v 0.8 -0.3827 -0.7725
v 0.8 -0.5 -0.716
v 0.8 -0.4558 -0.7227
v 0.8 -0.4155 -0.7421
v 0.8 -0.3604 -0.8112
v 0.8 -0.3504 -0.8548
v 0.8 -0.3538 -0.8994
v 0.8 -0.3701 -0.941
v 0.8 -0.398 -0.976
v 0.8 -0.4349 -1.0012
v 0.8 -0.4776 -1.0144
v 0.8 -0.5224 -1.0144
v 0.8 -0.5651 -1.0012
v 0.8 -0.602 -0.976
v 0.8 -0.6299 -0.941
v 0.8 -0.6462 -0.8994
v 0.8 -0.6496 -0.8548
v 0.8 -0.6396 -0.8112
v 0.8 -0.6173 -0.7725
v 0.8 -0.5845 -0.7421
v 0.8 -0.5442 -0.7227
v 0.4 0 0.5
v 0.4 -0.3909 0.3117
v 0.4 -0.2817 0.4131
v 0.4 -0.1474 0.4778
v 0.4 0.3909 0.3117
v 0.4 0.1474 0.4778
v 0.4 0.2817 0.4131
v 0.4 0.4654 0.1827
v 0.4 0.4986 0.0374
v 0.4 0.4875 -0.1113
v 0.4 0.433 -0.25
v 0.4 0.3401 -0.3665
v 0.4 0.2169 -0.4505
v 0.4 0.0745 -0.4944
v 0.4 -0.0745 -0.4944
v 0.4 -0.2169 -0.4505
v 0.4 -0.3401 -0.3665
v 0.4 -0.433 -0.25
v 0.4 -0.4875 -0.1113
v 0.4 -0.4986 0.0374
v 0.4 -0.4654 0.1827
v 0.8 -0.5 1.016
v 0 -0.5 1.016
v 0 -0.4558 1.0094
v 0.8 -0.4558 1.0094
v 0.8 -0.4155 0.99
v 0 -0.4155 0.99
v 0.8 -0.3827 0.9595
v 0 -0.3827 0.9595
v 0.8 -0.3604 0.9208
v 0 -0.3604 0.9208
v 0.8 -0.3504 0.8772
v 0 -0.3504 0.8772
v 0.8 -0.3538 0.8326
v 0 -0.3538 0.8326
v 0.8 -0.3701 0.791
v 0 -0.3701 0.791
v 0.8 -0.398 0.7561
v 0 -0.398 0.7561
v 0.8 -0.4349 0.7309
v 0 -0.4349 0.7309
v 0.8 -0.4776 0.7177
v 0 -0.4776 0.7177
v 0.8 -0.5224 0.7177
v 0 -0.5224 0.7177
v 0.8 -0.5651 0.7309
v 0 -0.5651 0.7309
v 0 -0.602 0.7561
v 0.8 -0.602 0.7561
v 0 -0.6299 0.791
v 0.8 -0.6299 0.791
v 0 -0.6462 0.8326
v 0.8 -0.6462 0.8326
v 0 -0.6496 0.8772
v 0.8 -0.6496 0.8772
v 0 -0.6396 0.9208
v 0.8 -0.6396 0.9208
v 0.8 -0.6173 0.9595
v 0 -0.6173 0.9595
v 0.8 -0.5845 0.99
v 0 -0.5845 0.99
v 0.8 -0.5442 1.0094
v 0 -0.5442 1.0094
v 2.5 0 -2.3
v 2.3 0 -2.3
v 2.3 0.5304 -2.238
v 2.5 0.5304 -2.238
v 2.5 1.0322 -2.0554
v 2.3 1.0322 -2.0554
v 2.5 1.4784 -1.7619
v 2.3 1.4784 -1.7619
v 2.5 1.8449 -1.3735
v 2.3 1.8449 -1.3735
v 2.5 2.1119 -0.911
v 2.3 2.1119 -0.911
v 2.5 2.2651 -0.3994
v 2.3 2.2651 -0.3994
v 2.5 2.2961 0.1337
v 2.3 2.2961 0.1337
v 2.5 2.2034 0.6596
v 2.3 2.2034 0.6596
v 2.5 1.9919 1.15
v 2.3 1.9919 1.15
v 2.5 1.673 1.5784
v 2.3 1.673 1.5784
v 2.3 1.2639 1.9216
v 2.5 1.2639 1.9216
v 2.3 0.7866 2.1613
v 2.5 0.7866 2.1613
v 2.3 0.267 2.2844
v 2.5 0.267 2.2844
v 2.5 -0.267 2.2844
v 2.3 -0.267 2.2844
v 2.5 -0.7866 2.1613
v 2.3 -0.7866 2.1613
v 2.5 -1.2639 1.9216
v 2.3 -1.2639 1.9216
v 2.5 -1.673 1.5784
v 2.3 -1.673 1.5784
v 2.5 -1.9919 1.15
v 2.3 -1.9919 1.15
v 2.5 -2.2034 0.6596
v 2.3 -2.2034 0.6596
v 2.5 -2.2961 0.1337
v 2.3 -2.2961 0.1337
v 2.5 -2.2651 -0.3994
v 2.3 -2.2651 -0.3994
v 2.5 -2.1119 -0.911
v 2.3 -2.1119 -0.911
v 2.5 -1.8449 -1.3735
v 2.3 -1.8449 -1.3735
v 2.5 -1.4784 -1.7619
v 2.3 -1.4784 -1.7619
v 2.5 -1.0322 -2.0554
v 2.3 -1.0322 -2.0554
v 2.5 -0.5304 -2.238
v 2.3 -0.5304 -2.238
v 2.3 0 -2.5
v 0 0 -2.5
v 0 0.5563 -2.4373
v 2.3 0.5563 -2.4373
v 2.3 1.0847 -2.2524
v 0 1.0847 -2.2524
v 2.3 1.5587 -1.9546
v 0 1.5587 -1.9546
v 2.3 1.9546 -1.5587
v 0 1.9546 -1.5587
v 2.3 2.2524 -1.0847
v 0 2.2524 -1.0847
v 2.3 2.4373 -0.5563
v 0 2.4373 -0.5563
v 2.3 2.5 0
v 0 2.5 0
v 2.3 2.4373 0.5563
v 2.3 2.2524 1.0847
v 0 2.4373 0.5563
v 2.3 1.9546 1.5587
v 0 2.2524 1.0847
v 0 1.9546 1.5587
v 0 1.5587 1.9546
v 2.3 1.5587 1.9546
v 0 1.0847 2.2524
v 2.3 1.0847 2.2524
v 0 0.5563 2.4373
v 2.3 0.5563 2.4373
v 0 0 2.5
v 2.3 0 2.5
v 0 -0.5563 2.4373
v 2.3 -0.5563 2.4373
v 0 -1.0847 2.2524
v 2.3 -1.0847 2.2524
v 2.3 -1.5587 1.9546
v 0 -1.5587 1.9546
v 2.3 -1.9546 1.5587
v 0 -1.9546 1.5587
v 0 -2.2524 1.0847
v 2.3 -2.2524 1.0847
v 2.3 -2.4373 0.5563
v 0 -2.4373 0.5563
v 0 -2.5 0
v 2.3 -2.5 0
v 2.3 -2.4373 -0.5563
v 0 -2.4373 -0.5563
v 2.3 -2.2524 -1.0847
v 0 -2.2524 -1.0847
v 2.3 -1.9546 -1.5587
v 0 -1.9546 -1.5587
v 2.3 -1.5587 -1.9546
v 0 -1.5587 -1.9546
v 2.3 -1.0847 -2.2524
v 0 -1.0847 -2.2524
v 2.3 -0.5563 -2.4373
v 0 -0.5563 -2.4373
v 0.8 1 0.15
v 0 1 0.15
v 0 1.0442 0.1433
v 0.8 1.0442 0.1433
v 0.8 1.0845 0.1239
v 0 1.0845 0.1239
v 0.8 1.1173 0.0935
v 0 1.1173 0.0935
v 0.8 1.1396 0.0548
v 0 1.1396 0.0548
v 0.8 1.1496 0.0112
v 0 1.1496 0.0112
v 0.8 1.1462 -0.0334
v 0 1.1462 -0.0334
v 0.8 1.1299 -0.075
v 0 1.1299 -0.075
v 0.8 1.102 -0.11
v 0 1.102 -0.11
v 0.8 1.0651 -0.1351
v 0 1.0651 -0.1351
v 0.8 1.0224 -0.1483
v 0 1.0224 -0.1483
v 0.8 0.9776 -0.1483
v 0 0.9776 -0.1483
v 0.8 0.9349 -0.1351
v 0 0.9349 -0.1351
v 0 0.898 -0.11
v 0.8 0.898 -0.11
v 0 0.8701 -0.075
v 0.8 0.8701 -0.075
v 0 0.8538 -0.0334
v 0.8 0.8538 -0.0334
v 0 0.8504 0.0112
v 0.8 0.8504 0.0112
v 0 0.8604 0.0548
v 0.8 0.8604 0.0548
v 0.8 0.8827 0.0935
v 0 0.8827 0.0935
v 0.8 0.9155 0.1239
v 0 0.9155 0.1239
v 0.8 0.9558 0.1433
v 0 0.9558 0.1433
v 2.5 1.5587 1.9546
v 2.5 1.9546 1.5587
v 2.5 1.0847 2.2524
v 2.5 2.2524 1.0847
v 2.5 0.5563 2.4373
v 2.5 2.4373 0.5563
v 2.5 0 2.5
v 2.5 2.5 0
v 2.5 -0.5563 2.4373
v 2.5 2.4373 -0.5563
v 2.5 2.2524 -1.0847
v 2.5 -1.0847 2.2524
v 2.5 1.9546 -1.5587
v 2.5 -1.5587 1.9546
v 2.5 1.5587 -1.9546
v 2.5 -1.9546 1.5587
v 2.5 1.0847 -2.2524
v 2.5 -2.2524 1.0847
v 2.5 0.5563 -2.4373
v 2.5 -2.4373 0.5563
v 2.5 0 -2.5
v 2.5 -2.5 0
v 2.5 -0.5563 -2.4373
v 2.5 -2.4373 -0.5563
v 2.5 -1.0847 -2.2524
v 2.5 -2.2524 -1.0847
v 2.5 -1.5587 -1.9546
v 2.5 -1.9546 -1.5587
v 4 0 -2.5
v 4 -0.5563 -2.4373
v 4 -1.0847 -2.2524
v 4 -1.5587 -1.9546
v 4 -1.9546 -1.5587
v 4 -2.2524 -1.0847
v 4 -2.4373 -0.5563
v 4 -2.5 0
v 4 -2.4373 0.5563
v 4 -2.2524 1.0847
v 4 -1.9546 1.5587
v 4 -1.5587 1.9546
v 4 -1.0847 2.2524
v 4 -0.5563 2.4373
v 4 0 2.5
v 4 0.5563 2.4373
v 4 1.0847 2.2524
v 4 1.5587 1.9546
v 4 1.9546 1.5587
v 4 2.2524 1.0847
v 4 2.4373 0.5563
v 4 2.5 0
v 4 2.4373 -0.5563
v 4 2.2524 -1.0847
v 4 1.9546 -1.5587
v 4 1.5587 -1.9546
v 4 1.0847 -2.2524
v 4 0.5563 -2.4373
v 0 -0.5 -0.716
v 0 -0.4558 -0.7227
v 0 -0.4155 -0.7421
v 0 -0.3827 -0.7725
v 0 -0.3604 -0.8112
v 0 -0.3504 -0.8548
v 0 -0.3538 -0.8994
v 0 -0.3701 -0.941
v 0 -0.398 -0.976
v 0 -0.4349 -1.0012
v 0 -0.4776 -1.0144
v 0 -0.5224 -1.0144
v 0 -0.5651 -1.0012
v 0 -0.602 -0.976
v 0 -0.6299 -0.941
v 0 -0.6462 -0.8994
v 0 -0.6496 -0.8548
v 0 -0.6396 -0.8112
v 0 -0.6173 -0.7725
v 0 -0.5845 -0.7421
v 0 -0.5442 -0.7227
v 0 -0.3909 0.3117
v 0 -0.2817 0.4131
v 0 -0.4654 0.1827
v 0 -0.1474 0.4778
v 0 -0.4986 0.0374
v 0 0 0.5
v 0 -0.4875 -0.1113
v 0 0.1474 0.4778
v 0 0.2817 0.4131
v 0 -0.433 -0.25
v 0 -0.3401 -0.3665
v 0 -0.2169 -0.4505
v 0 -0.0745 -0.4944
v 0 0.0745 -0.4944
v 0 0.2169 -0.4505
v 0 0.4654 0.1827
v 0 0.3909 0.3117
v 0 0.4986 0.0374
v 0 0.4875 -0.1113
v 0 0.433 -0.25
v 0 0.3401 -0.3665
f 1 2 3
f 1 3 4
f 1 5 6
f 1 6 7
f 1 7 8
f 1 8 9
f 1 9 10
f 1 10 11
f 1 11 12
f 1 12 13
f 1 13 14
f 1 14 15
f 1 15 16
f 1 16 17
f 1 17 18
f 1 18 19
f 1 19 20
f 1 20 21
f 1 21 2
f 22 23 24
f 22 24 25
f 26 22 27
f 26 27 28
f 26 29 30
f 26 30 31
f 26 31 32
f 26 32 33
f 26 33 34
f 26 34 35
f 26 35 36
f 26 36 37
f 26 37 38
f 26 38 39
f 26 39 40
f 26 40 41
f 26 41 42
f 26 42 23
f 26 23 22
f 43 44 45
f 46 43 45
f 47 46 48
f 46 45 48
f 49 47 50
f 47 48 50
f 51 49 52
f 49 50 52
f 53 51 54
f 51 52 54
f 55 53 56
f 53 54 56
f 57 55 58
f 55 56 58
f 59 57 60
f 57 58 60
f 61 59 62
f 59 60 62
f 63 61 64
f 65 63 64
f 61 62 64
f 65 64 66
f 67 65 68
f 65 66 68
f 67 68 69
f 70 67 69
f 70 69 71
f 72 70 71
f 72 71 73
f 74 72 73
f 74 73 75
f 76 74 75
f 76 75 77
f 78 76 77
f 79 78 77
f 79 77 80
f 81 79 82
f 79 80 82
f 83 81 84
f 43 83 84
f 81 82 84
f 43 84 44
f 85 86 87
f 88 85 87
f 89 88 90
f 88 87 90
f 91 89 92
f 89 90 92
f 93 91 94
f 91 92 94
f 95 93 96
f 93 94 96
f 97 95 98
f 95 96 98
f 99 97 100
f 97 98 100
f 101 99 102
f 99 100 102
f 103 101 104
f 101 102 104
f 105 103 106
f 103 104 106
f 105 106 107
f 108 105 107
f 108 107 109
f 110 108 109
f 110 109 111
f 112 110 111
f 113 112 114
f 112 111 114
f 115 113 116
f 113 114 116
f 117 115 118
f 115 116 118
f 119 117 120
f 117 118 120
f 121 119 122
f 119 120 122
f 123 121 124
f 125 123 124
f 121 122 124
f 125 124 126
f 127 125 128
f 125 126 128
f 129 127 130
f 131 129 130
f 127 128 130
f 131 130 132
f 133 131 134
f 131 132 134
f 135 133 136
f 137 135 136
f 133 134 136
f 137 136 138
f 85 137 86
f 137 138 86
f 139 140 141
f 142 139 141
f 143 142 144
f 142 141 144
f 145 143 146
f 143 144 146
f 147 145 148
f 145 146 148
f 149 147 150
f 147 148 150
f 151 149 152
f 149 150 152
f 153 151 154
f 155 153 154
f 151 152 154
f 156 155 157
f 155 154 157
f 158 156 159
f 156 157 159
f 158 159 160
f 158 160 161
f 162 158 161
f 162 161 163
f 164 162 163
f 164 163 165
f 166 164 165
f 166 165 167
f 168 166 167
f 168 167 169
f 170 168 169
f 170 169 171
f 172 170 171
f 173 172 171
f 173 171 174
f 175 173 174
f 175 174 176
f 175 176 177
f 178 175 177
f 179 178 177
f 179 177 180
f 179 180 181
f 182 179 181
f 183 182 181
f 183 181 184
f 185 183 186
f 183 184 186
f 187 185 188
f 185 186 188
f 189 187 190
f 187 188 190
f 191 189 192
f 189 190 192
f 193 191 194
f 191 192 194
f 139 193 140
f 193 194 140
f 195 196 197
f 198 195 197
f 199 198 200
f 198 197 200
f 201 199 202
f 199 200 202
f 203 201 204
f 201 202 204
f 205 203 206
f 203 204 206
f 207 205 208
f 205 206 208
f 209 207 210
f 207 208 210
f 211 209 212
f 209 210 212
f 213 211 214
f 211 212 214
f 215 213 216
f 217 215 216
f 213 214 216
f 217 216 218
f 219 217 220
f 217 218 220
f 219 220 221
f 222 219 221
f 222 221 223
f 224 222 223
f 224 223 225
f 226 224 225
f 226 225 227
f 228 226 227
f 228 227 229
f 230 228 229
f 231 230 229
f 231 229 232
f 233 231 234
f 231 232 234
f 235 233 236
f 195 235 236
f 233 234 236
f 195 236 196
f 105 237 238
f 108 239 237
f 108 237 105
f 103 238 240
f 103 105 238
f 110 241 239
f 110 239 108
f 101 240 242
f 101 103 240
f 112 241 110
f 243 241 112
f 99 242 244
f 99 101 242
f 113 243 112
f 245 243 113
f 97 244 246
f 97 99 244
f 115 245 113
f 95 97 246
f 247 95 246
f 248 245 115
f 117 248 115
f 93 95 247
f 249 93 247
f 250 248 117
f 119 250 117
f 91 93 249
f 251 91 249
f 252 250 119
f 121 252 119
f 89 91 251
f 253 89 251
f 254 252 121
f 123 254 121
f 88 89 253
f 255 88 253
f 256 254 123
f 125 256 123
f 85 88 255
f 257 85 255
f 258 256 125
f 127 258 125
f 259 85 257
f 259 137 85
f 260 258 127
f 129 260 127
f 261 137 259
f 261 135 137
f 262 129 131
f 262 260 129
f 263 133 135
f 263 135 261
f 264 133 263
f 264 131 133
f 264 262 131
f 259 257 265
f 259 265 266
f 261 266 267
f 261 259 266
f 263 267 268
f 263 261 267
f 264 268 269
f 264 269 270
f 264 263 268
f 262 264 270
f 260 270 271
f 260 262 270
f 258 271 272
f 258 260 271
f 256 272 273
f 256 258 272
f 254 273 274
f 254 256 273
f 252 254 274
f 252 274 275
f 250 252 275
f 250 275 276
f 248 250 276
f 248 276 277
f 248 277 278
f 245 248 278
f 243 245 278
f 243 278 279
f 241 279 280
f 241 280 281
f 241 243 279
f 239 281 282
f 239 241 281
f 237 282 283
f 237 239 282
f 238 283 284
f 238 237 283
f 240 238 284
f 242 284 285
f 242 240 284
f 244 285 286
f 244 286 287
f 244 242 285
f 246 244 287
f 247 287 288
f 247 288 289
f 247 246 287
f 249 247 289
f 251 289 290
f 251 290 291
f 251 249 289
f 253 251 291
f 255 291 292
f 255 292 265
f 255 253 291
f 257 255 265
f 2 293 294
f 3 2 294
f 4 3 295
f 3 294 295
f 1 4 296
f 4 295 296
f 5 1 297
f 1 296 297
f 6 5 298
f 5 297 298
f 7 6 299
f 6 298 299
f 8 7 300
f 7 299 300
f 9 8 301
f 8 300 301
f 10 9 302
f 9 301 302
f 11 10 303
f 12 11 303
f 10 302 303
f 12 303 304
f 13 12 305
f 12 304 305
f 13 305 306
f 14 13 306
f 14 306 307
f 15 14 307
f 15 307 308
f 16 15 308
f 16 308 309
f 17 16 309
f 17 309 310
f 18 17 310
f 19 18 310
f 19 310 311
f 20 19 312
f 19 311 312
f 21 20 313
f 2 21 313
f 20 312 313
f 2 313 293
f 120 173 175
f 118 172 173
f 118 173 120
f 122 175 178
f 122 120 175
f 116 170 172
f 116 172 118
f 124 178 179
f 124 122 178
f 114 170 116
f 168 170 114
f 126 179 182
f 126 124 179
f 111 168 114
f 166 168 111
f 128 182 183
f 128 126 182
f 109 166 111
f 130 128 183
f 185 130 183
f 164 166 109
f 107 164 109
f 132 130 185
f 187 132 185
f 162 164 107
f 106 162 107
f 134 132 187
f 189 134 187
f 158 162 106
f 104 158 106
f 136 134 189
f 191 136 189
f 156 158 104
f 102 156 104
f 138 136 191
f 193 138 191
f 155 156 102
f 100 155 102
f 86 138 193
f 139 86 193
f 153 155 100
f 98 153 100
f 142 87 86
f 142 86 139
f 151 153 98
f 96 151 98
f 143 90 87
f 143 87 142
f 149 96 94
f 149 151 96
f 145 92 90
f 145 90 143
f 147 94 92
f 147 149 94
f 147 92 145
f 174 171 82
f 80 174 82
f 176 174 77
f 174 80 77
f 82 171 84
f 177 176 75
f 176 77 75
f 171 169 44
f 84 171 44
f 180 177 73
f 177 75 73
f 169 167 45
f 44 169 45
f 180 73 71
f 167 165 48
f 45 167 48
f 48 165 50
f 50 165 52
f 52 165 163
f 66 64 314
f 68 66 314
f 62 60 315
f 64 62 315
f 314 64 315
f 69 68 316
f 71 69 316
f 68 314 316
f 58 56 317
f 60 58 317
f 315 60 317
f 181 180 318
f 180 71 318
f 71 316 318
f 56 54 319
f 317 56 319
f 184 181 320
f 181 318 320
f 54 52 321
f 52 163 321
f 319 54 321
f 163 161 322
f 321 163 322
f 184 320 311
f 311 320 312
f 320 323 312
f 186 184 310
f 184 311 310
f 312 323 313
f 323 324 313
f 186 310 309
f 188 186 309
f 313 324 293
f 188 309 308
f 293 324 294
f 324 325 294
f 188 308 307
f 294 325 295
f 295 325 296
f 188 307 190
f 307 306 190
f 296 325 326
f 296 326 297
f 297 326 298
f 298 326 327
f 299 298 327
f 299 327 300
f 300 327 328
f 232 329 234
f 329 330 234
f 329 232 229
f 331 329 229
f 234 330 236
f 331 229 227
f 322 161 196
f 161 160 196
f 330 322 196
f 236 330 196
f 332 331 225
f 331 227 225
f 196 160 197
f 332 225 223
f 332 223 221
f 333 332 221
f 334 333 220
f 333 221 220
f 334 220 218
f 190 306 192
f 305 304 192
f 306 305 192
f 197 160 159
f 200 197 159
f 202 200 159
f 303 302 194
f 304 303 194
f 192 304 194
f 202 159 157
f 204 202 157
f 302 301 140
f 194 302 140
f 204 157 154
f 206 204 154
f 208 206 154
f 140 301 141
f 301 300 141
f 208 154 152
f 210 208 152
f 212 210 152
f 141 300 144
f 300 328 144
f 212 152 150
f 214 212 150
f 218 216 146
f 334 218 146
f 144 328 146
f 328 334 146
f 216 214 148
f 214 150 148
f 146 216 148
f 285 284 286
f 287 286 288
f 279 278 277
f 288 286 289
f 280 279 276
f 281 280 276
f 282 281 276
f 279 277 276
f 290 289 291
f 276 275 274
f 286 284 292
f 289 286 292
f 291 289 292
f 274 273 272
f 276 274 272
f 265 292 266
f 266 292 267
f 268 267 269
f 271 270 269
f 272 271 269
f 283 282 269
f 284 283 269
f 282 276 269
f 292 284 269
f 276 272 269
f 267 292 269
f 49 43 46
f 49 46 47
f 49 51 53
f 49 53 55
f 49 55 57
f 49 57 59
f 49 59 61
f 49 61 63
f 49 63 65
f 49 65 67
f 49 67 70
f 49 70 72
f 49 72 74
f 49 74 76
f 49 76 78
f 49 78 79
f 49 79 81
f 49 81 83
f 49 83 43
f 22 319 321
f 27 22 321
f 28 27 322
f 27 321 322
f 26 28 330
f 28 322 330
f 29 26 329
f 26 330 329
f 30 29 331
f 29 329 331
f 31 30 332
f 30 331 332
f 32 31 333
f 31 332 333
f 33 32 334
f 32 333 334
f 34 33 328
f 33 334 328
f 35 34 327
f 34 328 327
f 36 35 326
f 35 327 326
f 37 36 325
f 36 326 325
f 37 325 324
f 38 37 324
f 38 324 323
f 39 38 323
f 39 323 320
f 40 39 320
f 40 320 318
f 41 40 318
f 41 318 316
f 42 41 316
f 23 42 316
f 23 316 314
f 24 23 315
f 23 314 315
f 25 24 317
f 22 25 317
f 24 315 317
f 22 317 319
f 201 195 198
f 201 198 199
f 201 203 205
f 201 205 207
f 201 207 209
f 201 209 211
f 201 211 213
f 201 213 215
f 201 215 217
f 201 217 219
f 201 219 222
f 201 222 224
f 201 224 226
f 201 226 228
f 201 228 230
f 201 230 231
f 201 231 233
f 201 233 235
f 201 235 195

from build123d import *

# Parameters (mm, degrees)
SKETCH_1_R          = 2.5
EXTRUDE_1_DEPTH     = 2.5
SKETCH_3_R          = 2.4
EXTRUDE_4_DEPTH     = 1.5
CUT_EXTRUDE_START   = -0.2
SKETCH_4_R          = 2.5
SKETCH_4_R_2        = 2.3
CUT_EXTRUDE_2_DEPTH = 0.2
SKETCH_5_R          = 2.5
SKETCH_5_R_2        = 2.4
EXTRUDE_5_DEPTH     = 1.5
SKETCH_6_R          = 0.5
CUT_EXTRUDE_3_DEPTH = 0.4
SKETCH_7_R          = 0.15
CUT_EXTRUDE_4_DEPTH = 0.8


with BuildPart() as part:
    # 草图1 → 凸台-拉伸1 (new body)
    with BuildSketch(Plane(origin=(0, 0, 0), x_dir=(0, 0, -1), z_dir=(1, 0, 0))):
        Circle(SKETCH_1_R)
    extrude(amount=EXTRUDE_1_DEPTH)

    # 草图3 → 凸台-拉伸4 (add)
    with BuildSketch(Plane(origin=(2.5, 0, 0), x_dir=(0, 0, -1), z_dir=(1, 0, 0))):
        Circle(SKETCH_3_R)
    extrude(amount=EXTRUDE_4_DEPTH)

    # 草图4 → 切除-拉伸2 (cut)
    with BuildSketch(Plane(origin=(2.5, 0, 0), x_dir=(0, 0, -1), z_dir=(1, 0, 0)).offset(CUT_EXTRUDE_START)):
        Circle(SKETCH_4_R)
        Circle(SKETCH_4_R_2, mode=Mode.SUBTRACT)
    extrude(amount=CUT_EXTRUDE_2_DEPTH, mode=Mode.SUBTRACT)

    # 草图5 → 凸台-拉伸5 (add)
    with BuildSketch(Plane.ZY.offset(-2.5)):
        with Locations(Location((0, 0, 0), (0, 0, 180))):
            Circle(SKETCH_5_R)
        Circle(SKETCH_5_R_2, mode=Mode.SUBTRACT)
    extrude(amount=-EXTRUDE_5_DEPTH)

    # 草图6 → 切除-拉伸3 (cut)
    with BuildSketch(Plane.ZY):
        Circle(SKETCH_6_R)
    extrude(amount=-CUT_EXTRUDE_3_DEPTH, mode=Mode.SUBTRACT)

    # 草图7 → 切除-拉伸4 (cut)
    with BuildSketch(Plane.ZY):
        with Locations((0, 1)):
            Circle(SKETCH_7_R)
        with Locations((-0.866025404, -0.5)):
            Circle(SKETCH_7_R)
        with Locations((0.866025404, -0.5)):
            Circle(SKETCH_7_R)
    extrude(amount=-CUT_EXTRUDE_4_DEPTH, mode=Mode.SUBTRACT)


solid = part.part
